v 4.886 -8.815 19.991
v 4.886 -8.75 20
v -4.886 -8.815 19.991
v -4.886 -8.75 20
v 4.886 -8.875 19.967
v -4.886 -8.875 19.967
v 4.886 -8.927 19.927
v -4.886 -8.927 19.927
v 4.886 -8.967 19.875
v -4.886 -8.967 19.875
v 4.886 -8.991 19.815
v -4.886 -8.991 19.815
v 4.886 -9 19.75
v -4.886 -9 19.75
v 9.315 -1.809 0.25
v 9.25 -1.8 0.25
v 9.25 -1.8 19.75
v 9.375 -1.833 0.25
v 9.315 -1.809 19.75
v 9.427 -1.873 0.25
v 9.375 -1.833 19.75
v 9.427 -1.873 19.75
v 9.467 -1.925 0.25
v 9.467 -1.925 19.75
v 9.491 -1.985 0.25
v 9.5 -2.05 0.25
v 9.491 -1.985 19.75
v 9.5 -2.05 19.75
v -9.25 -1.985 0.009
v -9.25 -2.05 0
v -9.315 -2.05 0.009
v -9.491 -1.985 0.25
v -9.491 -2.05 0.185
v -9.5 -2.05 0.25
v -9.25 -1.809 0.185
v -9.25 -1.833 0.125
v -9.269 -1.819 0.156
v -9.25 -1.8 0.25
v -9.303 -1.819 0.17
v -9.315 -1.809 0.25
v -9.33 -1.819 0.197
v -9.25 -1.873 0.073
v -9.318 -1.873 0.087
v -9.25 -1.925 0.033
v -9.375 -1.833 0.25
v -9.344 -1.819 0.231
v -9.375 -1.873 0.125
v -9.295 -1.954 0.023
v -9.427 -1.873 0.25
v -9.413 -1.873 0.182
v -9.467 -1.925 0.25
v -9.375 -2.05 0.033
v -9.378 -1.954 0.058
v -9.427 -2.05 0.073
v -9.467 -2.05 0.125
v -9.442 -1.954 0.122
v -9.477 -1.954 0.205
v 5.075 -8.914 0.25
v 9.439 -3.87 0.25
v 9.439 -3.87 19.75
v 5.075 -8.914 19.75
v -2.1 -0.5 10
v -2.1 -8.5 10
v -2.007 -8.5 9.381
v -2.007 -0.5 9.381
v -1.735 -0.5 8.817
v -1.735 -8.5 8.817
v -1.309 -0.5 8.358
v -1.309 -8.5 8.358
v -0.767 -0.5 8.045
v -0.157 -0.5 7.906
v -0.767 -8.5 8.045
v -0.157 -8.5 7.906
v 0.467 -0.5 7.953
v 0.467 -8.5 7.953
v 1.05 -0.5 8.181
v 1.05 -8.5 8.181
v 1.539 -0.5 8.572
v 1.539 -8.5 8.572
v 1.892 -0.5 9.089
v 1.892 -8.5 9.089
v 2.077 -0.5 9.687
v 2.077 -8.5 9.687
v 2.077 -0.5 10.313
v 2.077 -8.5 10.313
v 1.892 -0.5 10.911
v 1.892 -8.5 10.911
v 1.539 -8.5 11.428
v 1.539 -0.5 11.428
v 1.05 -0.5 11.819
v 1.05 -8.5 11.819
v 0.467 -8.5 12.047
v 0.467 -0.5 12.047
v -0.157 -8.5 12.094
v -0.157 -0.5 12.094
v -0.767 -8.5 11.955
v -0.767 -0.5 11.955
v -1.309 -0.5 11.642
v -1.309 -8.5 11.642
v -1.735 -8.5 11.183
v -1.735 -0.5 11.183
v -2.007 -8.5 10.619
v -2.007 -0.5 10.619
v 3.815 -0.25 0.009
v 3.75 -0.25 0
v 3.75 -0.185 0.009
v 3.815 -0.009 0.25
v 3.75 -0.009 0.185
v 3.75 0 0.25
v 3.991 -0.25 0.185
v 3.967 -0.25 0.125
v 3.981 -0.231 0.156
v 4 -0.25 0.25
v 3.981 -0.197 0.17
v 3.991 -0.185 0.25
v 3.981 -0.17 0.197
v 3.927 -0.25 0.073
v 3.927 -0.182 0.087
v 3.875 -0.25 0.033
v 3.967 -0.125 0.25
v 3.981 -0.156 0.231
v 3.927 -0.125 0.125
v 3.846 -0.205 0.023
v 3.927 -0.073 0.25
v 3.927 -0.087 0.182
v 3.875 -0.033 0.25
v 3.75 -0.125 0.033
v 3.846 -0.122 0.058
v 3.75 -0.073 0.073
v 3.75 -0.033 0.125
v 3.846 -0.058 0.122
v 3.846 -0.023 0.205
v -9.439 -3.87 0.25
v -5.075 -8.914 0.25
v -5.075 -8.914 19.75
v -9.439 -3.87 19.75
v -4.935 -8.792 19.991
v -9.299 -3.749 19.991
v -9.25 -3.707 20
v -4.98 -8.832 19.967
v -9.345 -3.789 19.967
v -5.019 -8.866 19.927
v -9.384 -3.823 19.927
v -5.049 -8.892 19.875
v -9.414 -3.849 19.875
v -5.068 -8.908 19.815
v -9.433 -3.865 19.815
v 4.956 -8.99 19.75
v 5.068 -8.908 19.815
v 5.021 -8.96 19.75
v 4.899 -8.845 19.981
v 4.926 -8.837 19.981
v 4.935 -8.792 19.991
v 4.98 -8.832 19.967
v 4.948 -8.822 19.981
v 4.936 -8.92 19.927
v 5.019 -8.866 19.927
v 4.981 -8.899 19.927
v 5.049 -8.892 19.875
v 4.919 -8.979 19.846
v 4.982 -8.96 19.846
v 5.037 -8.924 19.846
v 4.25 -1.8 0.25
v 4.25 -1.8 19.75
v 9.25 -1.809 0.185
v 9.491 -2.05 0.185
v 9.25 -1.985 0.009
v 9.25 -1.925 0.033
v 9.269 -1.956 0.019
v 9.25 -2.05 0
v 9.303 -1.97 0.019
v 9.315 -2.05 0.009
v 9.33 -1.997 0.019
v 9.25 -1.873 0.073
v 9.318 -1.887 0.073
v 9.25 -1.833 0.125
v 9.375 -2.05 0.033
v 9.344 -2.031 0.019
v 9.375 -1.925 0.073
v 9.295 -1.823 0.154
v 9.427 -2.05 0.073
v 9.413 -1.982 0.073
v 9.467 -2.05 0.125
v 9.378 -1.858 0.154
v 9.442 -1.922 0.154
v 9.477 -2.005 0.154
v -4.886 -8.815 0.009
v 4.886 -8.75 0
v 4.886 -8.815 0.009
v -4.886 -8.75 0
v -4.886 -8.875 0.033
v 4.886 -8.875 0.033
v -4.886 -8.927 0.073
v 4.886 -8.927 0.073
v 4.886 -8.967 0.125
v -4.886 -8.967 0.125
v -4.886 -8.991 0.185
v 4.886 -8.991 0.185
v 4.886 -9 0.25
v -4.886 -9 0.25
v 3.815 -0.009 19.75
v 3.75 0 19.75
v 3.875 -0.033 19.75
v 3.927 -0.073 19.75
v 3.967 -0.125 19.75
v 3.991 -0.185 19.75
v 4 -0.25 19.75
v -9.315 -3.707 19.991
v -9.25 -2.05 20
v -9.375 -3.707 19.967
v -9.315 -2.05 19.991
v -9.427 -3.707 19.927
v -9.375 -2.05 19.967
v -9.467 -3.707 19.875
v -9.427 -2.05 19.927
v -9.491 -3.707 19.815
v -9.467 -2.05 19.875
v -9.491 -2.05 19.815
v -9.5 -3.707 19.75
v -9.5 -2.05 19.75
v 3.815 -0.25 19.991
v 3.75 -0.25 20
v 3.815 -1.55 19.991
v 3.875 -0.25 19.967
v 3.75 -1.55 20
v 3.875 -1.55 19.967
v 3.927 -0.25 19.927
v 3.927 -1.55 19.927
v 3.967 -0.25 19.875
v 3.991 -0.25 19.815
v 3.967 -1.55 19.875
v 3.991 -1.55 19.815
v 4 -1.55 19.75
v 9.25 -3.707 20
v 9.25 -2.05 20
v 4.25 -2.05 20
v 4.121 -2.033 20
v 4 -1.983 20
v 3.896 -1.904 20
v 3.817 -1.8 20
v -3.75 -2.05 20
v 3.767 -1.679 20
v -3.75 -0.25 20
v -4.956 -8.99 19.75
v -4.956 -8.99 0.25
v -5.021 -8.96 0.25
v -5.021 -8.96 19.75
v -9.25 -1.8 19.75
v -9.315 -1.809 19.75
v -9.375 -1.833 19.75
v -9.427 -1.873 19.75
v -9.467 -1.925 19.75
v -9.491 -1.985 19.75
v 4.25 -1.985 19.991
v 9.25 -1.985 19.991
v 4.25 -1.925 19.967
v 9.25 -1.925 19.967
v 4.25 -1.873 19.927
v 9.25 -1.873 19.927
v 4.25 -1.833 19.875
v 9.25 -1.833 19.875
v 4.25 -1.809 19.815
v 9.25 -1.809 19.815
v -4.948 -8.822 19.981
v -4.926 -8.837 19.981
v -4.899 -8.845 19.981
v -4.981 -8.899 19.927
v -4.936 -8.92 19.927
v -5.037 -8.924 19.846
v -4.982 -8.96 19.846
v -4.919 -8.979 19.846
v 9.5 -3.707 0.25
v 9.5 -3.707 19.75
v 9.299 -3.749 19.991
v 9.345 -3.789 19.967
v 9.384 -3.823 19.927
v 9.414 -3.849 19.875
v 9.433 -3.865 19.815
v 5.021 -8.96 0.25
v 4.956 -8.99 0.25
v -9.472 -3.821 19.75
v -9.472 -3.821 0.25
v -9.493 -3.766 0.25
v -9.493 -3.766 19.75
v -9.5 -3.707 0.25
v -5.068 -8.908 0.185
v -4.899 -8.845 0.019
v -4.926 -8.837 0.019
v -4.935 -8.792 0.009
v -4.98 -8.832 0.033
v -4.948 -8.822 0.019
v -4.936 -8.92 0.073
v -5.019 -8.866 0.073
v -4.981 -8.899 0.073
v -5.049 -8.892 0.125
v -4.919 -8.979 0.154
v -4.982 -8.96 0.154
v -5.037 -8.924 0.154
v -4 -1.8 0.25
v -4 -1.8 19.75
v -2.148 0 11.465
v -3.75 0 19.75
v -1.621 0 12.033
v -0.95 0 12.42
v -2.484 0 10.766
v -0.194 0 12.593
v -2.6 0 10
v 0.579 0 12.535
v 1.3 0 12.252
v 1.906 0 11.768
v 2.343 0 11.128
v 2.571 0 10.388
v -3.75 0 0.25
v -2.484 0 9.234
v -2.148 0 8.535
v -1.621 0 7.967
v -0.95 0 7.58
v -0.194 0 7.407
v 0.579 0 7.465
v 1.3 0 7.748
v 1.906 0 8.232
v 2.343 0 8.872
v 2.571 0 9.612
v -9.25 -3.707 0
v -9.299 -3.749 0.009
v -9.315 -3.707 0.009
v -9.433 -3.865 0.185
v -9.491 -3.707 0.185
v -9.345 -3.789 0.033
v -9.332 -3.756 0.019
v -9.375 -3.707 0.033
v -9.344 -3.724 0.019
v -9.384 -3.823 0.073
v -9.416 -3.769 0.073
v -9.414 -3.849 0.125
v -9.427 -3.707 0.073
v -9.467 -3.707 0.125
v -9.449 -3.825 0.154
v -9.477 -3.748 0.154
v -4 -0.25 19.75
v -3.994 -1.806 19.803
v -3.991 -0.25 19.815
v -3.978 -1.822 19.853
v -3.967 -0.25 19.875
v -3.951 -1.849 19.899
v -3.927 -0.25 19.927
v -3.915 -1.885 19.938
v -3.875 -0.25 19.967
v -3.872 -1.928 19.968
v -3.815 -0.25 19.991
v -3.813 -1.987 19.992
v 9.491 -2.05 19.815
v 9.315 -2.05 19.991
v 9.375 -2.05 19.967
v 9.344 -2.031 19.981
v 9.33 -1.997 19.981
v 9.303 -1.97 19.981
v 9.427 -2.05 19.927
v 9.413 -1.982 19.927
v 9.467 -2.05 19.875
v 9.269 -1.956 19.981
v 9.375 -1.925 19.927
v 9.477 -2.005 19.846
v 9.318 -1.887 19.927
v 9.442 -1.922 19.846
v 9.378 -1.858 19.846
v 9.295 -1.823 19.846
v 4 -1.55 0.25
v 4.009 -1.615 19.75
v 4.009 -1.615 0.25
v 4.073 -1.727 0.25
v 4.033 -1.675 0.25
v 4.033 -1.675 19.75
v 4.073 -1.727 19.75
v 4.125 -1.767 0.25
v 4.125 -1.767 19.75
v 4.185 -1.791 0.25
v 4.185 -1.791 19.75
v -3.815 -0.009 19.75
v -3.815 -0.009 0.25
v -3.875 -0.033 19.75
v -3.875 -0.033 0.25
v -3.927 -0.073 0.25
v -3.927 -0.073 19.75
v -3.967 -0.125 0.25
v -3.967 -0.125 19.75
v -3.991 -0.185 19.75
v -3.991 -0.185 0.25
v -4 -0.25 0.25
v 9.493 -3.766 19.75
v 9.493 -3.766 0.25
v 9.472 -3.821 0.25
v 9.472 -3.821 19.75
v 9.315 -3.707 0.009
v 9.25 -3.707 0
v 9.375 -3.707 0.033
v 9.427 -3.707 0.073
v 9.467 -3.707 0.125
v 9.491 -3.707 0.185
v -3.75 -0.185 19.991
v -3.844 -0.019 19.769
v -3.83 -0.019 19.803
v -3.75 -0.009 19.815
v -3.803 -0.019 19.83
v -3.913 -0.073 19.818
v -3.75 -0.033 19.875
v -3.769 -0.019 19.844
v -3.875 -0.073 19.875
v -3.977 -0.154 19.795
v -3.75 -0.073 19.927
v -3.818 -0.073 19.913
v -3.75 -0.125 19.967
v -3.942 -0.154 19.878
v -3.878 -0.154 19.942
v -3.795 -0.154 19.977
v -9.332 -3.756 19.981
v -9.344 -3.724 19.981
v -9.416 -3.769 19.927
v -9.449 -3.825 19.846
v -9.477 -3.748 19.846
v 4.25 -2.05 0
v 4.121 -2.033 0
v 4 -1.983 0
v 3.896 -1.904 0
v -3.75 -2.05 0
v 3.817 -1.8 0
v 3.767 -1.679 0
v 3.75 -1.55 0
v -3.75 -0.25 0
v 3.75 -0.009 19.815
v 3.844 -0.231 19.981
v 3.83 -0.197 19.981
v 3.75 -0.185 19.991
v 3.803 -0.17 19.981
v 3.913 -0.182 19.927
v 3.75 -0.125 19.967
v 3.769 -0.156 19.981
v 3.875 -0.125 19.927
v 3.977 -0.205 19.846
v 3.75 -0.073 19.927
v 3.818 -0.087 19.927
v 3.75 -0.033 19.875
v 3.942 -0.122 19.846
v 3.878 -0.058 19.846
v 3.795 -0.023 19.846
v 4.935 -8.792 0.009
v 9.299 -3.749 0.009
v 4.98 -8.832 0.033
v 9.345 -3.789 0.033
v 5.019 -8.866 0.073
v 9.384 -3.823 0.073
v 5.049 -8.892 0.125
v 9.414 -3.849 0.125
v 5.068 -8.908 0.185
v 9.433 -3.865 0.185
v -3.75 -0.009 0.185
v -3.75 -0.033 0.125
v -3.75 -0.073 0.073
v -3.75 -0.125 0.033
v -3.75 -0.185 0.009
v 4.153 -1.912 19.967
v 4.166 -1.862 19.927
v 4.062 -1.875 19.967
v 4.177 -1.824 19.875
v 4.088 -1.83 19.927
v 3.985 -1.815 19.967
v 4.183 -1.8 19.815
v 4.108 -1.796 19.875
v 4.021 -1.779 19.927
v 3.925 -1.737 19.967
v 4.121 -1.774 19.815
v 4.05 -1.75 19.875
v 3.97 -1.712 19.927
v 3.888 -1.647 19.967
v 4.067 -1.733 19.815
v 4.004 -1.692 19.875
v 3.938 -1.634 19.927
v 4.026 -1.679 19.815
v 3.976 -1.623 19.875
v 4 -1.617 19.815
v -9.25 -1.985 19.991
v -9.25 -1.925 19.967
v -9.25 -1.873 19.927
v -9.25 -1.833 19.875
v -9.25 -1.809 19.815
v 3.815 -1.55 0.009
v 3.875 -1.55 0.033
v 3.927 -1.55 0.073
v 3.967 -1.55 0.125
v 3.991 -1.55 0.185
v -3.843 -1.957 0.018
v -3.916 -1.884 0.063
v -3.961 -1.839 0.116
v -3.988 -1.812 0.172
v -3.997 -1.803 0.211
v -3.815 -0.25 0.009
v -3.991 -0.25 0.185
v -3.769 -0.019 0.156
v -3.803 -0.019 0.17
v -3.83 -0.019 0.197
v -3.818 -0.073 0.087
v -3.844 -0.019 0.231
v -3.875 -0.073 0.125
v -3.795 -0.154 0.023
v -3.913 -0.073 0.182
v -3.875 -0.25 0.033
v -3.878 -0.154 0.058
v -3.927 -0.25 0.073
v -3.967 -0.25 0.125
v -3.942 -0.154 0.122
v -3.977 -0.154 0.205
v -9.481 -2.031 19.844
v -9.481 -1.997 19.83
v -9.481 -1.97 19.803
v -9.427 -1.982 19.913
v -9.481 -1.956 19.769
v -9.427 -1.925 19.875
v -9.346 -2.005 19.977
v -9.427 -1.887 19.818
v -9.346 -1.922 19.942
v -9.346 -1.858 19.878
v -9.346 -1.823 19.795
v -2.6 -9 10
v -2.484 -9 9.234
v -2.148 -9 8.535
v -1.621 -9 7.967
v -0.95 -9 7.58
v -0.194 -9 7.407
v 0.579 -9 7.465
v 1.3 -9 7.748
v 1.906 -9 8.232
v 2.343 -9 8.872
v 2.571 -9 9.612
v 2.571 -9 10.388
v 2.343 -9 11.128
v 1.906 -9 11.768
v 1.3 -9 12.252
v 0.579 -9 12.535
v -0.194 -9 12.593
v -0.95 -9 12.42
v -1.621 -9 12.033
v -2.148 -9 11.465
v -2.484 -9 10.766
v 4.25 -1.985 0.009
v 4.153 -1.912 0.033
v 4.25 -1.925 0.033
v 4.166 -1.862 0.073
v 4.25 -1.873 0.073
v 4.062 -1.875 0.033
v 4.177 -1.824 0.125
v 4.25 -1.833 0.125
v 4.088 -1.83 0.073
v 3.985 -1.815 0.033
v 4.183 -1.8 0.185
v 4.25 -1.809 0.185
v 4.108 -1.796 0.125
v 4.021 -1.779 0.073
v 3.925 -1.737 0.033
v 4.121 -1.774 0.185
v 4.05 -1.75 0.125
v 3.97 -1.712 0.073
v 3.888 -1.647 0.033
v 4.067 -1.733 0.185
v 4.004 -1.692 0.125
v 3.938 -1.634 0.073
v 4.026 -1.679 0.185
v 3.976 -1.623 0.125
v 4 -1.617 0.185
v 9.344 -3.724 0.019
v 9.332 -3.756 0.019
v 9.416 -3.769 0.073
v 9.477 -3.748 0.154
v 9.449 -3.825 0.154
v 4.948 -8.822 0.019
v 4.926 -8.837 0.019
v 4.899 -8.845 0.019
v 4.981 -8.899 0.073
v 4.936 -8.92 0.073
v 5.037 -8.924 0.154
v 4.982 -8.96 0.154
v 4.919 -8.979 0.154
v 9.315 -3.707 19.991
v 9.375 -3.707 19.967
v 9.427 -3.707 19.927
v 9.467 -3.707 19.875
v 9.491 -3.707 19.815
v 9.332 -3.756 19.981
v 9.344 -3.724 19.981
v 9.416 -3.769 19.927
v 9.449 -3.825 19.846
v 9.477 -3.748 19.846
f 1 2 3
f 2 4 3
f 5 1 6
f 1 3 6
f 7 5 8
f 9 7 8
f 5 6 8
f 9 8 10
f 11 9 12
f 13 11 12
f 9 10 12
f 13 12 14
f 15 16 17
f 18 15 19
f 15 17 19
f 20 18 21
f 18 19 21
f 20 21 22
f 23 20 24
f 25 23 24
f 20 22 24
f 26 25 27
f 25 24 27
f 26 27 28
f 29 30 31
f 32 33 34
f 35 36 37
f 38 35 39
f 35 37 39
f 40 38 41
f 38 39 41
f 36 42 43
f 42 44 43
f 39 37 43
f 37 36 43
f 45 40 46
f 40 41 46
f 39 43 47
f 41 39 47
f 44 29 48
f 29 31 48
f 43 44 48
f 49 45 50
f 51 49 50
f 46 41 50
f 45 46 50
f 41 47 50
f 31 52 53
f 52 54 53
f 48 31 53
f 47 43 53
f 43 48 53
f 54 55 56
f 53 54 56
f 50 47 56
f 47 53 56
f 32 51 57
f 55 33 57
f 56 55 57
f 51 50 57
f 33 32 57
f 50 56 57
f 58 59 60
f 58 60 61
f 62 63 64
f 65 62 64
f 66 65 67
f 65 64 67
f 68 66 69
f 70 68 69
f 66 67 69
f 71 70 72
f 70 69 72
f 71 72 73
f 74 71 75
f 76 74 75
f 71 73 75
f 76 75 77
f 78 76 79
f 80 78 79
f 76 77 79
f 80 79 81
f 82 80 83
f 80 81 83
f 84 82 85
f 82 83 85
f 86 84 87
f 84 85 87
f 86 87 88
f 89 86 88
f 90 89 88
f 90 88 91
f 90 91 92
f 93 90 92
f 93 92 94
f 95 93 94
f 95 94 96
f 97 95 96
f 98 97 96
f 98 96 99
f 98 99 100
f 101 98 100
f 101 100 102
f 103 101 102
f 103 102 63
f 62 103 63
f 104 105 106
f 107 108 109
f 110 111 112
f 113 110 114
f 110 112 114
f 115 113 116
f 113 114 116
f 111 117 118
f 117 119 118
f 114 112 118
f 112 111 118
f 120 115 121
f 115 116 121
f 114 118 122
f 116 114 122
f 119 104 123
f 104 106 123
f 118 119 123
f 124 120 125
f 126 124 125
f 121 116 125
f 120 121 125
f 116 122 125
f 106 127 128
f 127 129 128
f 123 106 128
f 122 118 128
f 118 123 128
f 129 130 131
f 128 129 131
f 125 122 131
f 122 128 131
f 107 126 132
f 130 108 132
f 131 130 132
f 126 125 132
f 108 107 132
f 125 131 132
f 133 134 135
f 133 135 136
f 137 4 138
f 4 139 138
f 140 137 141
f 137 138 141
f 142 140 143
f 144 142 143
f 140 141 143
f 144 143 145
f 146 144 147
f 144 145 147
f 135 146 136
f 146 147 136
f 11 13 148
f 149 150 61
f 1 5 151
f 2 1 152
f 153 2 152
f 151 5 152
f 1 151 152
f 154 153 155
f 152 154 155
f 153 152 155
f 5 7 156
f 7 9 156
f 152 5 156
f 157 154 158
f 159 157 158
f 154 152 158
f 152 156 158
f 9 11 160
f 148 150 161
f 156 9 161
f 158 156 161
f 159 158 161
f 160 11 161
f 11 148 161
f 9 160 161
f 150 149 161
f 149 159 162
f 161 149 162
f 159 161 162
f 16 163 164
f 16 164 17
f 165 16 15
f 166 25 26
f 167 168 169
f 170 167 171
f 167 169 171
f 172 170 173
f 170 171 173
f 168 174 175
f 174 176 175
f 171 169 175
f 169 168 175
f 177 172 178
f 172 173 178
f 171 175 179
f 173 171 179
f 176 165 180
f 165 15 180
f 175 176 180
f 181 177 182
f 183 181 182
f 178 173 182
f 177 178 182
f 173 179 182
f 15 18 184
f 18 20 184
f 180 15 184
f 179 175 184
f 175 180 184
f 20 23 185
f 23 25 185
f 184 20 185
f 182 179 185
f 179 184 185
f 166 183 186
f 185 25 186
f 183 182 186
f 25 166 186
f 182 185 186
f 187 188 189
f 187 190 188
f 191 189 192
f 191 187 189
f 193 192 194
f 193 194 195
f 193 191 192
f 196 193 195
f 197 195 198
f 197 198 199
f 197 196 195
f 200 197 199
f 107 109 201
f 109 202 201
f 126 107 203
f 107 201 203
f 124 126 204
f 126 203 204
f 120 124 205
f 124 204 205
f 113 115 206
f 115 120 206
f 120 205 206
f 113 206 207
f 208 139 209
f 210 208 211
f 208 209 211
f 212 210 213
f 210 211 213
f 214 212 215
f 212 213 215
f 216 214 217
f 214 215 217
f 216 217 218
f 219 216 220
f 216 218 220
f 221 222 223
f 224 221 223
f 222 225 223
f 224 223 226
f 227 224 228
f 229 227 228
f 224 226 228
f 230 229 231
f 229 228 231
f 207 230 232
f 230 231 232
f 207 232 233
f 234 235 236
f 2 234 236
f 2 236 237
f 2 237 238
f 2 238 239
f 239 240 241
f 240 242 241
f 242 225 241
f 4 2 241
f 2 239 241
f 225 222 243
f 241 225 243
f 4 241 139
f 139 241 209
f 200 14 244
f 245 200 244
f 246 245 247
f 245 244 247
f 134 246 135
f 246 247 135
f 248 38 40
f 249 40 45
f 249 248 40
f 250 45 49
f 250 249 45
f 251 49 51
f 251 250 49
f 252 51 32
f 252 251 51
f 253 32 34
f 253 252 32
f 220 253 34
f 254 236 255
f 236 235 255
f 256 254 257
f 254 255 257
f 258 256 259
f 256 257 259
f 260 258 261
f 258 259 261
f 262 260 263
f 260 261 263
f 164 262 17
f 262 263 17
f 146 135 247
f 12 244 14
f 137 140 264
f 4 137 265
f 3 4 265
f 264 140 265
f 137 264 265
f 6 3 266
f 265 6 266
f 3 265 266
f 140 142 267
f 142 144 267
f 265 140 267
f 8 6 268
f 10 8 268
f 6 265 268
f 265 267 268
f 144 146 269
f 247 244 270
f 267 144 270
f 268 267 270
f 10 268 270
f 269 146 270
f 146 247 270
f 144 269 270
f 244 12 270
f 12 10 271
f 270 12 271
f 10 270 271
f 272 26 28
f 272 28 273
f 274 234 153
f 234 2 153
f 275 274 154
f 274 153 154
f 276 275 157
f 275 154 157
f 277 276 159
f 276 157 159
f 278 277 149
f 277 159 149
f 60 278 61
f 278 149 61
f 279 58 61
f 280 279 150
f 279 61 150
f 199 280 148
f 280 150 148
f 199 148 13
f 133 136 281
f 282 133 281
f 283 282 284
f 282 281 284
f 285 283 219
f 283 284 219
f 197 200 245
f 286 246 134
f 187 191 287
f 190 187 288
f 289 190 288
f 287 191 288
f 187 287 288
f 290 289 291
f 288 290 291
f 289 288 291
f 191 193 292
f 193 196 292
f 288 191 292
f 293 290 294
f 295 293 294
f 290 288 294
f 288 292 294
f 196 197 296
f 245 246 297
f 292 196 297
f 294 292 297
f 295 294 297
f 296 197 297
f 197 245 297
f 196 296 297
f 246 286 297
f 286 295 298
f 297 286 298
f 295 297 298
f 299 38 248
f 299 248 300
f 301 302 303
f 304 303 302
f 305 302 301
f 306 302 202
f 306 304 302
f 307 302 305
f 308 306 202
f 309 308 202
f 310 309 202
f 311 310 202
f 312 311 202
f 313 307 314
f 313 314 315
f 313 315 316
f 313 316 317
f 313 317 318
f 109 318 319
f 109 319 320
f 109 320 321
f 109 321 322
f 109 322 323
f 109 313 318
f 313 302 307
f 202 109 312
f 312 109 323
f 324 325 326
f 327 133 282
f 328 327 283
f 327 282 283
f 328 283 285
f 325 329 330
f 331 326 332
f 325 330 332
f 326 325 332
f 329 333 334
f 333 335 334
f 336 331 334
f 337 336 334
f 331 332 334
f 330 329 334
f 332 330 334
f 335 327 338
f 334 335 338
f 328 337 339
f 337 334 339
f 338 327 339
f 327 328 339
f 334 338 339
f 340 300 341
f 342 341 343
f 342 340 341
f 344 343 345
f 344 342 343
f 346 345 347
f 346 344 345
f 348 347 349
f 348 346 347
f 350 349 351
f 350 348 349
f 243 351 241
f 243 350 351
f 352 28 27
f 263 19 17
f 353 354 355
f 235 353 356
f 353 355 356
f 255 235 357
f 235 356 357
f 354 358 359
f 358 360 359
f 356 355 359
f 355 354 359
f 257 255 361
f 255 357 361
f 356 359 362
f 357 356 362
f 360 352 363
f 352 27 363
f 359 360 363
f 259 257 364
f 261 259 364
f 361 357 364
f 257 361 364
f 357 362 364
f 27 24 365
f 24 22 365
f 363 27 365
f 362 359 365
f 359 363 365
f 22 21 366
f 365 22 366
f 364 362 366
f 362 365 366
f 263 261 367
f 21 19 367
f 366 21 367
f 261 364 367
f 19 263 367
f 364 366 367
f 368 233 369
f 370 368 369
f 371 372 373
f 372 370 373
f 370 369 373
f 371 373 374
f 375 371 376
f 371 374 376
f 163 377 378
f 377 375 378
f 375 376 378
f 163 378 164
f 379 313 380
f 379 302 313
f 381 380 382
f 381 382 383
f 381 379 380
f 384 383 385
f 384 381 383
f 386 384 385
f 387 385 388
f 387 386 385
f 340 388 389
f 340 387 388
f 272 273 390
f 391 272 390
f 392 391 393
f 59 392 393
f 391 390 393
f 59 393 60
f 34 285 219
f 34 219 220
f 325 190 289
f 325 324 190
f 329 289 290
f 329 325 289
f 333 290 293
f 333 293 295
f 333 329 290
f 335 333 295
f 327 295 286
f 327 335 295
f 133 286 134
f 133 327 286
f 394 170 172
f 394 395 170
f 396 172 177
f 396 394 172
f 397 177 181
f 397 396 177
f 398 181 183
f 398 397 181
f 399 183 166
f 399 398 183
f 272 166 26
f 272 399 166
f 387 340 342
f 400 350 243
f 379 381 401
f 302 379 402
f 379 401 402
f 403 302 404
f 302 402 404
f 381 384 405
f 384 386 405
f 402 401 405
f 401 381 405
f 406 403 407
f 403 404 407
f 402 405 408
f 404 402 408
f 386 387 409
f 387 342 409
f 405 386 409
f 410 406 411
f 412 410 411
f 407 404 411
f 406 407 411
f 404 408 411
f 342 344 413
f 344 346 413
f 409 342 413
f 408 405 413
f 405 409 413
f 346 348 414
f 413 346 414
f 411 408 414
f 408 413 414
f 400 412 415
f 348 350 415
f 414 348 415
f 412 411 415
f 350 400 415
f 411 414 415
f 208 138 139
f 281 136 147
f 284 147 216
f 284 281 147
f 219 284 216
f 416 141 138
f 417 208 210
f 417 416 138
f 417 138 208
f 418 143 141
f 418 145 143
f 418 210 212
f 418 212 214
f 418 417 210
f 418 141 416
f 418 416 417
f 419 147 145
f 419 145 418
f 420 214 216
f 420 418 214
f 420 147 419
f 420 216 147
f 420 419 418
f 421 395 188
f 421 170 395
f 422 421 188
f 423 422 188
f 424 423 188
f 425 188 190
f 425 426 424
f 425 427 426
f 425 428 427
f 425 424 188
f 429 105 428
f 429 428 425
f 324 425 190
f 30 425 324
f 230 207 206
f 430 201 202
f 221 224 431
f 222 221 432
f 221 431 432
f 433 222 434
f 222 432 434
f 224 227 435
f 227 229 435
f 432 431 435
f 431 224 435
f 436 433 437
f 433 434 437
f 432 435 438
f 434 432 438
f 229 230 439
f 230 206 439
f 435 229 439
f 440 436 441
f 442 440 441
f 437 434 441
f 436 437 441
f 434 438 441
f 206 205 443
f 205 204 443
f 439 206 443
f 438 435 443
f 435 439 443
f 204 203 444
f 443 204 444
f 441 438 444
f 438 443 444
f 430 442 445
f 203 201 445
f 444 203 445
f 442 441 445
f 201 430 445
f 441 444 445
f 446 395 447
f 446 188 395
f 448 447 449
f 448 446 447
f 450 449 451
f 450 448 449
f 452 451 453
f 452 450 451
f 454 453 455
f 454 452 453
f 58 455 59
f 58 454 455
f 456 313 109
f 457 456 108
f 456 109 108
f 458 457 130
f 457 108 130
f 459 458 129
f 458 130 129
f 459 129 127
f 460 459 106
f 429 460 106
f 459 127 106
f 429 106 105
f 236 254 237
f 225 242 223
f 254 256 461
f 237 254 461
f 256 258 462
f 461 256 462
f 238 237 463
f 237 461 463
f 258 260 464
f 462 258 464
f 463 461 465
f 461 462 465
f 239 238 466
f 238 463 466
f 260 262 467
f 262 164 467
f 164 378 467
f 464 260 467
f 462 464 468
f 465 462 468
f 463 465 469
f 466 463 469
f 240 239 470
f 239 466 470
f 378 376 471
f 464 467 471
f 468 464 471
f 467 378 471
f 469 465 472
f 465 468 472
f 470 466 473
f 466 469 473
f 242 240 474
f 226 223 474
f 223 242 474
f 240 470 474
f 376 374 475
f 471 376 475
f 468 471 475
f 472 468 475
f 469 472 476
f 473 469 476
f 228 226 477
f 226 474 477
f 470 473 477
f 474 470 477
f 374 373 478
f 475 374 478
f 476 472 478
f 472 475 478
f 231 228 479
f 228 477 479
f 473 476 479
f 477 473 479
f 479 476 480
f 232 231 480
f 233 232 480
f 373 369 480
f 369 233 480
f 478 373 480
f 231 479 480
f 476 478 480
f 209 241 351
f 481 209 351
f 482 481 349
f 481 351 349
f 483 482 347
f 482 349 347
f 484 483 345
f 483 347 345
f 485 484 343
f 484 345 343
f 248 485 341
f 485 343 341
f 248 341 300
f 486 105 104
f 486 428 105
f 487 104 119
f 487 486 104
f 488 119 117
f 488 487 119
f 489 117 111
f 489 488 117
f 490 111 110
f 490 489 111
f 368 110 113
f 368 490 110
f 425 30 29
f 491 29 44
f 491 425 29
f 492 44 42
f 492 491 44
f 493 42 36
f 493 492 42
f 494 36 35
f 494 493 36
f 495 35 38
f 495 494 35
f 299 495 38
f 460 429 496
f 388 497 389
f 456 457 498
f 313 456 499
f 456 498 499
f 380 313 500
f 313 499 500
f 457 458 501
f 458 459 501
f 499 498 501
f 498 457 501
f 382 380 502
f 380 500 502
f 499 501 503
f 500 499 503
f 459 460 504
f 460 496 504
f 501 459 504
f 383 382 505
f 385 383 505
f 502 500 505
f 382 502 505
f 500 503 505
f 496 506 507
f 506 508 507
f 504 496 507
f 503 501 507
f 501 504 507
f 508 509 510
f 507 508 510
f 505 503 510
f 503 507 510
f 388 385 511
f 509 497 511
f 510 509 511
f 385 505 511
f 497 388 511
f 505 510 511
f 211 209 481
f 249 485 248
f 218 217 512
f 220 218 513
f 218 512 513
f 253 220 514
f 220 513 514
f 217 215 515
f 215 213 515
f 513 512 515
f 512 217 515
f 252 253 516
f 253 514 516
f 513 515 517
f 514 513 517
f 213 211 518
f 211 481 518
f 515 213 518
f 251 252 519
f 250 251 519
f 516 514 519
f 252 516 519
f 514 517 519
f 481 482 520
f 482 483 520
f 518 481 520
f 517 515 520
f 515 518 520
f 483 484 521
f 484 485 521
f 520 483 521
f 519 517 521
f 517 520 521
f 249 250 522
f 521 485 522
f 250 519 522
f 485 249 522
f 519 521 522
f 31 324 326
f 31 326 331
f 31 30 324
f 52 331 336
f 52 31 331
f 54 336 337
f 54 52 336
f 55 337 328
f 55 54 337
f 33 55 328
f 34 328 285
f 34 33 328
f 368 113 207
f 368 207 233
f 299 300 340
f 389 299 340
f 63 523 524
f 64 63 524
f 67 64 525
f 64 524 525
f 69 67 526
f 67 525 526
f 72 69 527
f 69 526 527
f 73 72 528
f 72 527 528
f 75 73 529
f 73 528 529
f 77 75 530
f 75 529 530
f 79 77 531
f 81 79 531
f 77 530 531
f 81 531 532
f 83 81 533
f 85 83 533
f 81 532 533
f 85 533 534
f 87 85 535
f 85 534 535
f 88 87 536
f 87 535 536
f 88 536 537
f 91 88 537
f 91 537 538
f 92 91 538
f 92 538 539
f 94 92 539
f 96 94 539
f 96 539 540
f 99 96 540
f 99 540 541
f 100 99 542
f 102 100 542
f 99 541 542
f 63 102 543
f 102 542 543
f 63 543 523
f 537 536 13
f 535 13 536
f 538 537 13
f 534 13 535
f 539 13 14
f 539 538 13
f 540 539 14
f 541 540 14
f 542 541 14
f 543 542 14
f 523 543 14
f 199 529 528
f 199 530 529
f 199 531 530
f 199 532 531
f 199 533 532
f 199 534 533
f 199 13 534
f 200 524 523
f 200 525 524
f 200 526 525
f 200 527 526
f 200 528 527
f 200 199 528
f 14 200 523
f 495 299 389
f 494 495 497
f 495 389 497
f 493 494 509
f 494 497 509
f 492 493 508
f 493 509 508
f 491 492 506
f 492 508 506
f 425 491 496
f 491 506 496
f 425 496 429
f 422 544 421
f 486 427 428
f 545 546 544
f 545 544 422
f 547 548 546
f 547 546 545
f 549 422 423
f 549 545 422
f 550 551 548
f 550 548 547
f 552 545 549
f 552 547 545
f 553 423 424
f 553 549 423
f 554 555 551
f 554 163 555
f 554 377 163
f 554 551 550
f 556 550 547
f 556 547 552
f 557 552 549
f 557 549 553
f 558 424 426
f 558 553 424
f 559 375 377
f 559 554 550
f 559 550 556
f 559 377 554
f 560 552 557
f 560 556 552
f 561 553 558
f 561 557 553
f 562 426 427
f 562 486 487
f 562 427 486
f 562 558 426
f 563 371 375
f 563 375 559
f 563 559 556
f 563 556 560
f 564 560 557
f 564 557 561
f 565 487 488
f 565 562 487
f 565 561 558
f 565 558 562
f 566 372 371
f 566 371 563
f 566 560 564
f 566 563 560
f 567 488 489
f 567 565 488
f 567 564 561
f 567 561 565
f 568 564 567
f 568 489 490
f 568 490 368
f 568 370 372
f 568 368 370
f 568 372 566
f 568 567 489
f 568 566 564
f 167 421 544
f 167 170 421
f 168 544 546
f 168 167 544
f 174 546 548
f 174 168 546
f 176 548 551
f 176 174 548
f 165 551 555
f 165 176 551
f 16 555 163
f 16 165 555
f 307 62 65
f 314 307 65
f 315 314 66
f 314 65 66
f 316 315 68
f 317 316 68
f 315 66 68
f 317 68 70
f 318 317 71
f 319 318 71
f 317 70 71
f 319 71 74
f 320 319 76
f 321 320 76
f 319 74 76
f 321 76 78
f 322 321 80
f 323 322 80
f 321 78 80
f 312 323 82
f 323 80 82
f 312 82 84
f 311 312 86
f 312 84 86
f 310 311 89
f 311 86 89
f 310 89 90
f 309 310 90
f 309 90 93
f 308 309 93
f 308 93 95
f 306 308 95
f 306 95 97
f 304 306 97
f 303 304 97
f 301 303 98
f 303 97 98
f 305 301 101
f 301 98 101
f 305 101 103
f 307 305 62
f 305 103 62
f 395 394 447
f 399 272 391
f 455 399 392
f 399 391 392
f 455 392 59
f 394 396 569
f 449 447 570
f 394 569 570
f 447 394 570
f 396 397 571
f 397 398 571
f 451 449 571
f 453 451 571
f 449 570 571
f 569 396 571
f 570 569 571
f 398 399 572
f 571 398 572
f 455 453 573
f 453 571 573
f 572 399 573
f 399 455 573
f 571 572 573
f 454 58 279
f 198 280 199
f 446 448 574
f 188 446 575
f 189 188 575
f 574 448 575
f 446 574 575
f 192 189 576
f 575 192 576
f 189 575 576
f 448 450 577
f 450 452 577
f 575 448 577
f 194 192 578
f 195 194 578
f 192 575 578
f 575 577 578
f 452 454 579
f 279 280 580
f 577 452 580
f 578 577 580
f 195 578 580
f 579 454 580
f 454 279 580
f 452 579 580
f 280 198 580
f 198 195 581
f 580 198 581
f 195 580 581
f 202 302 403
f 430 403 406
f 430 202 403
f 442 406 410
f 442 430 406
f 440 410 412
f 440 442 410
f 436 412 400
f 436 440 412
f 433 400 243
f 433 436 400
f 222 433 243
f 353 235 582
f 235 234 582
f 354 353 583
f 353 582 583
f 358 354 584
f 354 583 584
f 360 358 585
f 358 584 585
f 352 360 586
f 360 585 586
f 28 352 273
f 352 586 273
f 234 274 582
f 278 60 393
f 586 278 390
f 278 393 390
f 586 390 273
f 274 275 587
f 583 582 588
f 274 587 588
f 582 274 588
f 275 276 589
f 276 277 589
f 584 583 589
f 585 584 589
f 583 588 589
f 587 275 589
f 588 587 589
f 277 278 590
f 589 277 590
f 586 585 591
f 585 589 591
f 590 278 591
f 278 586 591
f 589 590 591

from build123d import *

# Parameters (mm, degrees)
BOSS_EXTRUDE1_DEPTH   = 20
M5X0_8_TAPPED_HOLE1_D = 4.2
CHAMFER1_SIZE         = 0.5
FILLET1_R             = 0.25


with BuildPart() as part:
    # Sketch1 → Boss-Extrude1 (new body)
    with BuildSketch(Plane.XY):
        Polygon((-4, 0), (4, 0), (4, -1.8), (9.5, -1.8), (9.5, -3.8), (5, -9), (-5, -9), (-9.5, -3.8), (-9.5, -1.8), (-4, -1.8), align=None)
    extrude(amount=BOSS_EXTRUDE1_DEPTH)

    # M5x0.8 Tapped Hole1 (through all)
    with Locations(Plane(origin=(0, 0, 0), x_dir=(1, 0, 0), z_dir=(0, 1, 0))):
        with Locations((0, -10)):
            Hole(M5X0_8_TAPPED_HOLE1_D / 2)

    # Chamfer1
    chamfer1_edges = [part.edges().sort_by_distance(p)[0] for p in [
        (2.1, 0, 10),
        (2.1, -9, 10),
    ]]
    chamfer(chamfer1_edges, length=CHAMFER1_SIZE)

    # Fillet1
    fillet1_edges = [part.edges().sort_by_distance(p)[0] for p in [
        (-4, -0.9, 20),
        (7.25, -6.4, 0),
        (0, -9, 0),
        (-7.25, -6.4, 0),
        (-9.5, -2.8, 0),
        (-6.75, -1.8, 0),
        (-4, -0.9, 0),
        (0, 0, 0),
        (4, -0.9, 0),
        (-6.75, -1.8, 20),
        (-9.5, -2.8, 20),
        (4, -1.8, 10),
        (9.5, -1.8, 10),
        (9.5, -3.8, 10),
        (5, -9, 10),
        (-5, -9, 10),
        (-9.5, -3.8, 10),
        (-9.5, -1.8, 10),
        (-4, 0, 10),
        (4, 0, 10),
        (-7.25, -6.4, 20),
        (0, -9, 20),
        (7.25, -6.4, 20),
        (9.5, -2.8, 20),
        (6.75, -1.8, 20),
        (4, -0.9, 20),
        (0, 0, 20),
        (6.75, -1.8, 0),
        (9.5, -2.8, 0),
    ]]
    fillet(fillet1_edges, radius=FILLET1_R)


solid = part.part
